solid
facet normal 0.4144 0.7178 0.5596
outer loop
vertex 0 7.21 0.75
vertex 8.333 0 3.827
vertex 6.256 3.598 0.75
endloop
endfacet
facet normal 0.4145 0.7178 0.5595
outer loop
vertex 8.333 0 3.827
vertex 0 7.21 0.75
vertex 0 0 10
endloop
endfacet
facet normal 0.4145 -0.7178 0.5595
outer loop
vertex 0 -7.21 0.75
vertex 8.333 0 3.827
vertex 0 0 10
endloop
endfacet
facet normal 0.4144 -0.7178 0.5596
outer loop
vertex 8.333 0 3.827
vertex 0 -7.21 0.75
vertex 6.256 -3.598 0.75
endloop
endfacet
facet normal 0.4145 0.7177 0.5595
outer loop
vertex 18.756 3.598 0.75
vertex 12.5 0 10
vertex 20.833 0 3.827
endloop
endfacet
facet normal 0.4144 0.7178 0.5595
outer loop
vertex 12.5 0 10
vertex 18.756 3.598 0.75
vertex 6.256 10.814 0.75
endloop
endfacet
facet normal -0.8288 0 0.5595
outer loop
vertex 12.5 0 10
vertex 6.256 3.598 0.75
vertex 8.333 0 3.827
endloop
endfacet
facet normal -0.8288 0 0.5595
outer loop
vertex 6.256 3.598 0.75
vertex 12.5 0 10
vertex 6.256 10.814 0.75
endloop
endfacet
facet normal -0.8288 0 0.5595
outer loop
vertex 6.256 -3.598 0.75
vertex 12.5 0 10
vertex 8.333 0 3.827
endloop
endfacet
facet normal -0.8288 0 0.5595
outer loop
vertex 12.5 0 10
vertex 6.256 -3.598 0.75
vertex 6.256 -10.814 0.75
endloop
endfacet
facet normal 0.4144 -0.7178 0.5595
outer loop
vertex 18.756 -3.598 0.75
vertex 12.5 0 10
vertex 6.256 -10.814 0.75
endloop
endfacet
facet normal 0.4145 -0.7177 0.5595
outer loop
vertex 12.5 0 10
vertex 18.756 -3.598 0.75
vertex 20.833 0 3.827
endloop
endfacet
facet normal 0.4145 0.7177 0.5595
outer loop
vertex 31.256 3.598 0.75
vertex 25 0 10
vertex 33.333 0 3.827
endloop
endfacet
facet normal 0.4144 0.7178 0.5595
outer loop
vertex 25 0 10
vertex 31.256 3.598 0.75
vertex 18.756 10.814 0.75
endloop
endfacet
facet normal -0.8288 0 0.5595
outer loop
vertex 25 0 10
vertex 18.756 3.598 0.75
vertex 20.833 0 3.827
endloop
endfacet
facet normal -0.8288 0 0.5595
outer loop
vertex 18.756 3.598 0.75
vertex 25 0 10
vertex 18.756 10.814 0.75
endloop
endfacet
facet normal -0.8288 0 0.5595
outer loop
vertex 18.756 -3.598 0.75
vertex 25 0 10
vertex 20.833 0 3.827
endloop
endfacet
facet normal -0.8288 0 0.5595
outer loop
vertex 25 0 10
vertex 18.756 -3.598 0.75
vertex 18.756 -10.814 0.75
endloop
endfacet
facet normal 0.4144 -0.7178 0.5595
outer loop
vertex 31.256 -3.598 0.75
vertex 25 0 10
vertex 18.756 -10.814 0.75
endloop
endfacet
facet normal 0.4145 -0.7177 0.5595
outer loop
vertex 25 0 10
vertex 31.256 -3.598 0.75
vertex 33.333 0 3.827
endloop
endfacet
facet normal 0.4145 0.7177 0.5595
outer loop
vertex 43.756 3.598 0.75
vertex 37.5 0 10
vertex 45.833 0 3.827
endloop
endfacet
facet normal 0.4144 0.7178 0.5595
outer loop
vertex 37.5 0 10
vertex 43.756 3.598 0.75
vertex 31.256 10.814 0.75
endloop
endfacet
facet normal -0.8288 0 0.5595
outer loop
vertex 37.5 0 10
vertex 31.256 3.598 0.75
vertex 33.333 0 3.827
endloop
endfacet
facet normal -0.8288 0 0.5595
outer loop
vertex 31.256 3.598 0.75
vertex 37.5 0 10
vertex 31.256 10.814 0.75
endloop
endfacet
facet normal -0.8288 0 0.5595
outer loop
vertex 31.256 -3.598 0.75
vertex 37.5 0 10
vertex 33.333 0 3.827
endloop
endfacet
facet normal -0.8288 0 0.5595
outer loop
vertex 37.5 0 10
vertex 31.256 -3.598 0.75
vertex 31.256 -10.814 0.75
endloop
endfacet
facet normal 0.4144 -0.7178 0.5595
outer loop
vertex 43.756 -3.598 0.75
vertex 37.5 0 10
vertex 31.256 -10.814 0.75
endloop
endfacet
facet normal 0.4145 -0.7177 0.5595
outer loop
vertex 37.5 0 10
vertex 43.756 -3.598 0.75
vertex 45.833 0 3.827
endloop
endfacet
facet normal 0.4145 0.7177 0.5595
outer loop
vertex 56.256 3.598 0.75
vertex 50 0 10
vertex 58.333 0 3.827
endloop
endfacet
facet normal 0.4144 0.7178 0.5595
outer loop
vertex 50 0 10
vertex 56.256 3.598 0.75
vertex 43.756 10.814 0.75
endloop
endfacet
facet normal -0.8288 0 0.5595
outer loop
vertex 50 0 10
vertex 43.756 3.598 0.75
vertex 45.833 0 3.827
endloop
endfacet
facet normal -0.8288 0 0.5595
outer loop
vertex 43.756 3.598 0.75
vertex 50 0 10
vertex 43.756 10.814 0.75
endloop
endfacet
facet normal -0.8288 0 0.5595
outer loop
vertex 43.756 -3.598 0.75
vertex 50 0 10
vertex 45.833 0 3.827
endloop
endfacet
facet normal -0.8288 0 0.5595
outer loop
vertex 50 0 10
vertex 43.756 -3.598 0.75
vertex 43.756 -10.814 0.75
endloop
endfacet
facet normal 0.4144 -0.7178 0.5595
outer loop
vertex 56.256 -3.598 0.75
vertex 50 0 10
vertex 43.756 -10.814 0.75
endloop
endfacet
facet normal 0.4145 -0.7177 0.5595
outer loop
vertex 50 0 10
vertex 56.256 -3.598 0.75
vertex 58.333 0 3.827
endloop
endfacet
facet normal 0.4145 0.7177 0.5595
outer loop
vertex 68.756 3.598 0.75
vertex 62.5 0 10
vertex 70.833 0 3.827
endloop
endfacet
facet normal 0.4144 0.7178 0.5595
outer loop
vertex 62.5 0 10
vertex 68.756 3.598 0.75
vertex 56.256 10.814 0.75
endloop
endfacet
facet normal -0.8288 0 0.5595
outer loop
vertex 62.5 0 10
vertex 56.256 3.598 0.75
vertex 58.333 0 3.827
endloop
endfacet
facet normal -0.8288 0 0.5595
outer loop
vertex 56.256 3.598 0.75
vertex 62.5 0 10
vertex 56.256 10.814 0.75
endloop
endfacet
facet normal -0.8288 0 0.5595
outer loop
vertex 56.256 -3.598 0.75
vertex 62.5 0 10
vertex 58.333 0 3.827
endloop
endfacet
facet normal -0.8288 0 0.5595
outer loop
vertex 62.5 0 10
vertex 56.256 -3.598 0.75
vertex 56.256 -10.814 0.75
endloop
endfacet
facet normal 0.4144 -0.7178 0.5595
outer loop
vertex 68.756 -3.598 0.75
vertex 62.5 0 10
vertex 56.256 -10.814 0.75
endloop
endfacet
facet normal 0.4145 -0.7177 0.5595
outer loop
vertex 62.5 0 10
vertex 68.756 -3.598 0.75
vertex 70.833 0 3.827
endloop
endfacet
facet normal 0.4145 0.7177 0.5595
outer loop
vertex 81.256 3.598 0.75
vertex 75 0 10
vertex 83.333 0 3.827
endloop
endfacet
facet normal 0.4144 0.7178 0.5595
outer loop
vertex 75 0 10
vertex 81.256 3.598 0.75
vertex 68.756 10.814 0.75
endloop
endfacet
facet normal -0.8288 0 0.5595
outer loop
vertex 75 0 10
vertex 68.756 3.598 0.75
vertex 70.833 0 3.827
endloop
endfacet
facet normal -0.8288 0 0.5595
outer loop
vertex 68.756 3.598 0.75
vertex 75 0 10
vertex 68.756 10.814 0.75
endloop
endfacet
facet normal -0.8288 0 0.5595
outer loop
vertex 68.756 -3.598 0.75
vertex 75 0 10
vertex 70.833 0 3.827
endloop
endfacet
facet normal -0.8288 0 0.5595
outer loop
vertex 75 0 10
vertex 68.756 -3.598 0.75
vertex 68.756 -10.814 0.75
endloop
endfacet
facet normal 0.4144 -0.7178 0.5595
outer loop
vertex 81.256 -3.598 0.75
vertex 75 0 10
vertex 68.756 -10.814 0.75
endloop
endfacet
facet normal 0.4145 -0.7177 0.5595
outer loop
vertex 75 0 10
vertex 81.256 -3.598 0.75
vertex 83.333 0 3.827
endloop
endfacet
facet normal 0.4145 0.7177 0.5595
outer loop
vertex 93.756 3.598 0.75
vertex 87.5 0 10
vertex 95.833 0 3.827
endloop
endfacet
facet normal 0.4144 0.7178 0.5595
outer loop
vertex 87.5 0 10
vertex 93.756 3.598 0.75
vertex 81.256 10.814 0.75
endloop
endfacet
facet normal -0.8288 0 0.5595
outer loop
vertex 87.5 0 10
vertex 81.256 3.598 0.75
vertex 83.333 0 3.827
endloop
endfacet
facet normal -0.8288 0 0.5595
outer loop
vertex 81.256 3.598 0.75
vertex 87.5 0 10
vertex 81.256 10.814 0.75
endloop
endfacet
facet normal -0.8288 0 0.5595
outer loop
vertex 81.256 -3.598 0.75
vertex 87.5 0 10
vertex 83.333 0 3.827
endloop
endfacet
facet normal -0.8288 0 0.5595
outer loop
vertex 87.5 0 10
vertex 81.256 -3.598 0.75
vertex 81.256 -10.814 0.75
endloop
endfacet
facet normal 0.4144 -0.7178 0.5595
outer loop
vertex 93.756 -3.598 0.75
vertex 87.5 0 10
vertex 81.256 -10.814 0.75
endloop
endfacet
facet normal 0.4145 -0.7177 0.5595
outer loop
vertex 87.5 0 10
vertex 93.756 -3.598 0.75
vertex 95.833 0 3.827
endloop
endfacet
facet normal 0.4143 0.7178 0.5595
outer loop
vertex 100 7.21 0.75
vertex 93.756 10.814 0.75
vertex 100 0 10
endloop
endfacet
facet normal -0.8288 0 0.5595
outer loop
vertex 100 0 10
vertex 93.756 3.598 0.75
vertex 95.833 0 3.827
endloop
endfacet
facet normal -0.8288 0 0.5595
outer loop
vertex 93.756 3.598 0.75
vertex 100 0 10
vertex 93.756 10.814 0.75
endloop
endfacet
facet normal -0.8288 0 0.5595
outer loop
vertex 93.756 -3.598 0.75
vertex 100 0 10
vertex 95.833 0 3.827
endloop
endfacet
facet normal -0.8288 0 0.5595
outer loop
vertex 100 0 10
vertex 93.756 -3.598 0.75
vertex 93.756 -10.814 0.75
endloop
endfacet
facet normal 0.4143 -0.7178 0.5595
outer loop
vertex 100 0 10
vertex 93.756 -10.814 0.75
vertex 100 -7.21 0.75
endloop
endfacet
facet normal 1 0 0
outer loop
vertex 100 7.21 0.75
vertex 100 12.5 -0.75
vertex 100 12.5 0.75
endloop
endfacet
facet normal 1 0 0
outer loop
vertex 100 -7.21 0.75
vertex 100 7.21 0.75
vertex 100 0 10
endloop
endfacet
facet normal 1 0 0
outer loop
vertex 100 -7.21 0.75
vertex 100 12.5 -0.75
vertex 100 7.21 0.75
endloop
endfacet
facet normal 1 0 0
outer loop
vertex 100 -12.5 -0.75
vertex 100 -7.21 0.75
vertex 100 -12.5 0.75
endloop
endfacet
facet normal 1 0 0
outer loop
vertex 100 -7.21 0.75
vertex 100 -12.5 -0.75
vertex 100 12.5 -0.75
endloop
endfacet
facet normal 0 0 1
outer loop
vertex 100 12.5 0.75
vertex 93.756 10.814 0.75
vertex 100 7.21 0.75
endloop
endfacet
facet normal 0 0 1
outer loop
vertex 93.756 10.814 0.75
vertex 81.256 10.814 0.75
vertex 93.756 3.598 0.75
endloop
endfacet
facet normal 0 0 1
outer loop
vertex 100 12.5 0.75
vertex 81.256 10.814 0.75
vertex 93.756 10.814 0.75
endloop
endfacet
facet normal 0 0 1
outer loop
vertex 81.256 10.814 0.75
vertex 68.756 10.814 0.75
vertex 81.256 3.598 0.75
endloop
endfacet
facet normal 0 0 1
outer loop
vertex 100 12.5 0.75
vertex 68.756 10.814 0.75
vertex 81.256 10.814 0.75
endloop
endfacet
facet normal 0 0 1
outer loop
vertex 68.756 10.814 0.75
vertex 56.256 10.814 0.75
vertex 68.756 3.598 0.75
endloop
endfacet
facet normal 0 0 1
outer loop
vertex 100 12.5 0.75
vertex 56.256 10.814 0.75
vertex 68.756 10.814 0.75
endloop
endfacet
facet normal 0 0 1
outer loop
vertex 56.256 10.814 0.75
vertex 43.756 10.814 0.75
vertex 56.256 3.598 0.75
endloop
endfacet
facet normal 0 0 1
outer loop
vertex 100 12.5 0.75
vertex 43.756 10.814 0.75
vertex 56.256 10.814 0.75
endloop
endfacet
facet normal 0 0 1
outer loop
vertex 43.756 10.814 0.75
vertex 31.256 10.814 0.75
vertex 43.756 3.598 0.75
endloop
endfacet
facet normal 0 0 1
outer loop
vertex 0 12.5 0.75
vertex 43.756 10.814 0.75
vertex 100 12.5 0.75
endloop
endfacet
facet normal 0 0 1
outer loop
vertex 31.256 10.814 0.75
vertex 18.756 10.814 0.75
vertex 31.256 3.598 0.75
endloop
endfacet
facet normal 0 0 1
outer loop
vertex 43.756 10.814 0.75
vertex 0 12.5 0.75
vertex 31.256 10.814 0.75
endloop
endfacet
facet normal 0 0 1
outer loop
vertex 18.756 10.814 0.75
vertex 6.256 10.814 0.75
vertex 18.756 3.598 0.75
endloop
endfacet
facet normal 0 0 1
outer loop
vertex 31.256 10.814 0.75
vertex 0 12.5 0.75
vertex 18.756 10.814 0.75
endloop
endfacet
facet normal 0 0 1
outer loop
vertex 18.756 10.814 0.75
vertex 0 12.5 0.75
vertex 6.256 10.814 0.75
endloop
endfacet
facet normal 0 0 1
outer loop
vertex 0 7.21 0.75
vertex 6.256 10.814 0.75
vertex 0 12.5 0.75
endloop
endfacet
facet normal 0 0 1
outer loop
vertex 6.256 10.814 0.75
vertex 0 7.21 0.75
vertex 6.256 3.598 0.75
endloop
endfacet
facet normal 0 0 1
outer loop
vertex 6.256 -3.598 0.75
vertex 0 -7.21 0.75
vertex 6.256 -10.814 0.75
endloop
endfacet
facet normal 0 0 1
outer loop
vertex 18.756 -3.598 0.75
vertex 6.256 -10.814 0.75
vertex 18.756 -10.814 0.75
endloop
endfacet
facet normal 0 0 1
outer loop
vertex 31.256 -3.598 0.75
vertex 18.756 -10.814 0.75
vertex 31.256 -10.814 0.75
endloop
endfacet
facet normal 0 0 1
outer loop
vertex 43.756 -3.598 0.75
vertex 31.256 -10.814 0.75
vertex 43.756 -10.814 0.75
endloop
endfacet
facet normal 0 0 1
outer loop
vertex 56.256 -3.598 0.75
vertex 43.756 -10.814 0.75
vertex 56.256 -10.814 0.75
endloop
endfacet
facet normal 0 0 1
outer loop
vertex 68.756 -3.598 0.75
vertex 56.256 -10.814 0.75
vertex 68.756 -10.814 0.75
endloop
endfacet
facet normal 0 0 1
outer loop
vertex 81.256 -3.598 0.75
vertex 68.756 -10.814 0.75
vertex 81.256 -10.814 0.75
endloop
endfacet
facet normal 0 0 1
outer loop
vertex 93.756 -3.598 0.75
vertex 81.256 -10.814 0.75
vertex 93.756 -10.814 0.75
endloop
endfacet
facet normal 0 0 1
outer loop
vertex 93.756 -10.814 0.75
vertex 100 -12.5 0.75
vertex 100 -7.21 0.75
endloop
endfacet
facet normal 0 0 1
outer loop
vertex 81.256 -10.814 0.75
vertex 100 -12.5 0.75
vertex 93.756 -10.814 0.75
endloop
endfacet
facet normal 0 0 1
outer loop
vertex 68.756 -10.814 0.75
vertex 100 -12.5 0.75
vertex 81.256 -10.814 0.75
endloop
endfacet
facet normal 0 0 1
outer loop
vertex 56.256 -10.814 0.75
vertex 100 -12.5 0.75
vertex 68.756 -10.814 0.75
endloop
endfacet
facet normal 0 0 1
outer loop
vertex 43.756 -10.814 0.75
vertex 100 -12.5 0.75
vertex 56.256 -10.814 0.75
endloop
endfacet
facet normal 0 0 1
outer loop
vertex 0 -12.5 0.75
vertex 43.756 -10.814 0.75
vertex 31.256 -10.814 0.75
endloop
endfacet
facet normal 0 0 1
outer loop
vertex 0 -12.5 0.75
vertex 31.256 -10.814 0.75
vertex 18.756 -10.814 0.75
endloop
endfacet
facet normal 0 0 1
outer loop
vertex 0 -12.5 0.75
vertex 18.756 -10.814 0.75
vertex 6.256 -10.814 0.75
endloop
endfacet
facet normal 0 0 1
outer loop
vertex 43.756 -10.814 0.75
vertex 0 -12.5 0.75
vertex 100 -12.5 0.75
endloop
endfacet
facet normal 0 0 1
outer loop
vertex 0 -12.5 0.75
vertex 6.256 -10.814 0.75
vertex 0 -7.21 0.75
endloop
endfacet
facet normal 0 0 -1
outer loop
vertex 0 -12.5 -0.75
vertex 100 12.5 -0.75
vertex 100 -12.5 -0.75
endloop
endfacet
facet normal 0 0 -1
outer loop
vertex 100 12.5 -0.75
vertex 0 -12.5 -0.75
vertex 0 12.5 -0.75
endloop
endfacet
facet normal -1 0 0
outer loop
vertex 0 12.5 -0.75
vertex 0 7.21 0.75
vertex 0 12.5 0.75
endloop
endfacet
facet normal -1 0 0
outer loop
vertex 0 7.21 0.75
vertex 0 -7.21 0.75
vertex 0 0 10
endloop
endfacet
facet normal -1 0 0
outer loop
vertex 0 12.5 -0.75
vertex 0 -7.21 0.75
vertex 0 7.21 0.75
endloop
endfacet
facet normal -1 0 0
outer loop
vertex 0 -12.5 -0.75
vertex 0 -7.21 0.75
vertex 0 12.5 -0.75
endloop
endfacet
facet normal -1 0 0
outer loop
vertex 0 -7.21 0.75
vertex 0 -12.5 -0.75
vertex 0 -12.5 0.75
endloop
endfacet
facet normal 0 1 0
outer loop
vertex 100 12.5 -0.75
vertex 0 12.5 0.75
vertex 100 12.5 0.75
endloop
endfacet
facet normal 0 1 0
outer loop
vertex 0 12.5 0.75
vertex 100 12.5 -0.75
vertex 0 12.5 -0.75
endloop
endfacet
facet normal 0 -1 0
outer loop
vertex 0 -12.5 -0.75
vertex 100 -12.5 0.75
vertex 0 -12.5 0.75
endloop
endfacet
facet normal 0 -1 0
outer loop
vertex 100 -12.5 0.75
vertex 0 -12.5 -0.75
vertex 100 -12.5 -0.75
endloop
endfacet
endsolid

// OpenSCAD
$r = 25 / 2;
$r2 = 11 / 2;
$d = 1.5;
$fn = 3;
$links = 8;

difference() {
    union() {
for (i = [0:$links]) {
    
     translate([i * $r, 0, 5]) {
        rotate([0, 0, 0]) {
            cylinder(10, $r+1, 0, true);
        }
     }
}
translate([($links)/2 * $r, 0, 0]) {
     cube([$r * ($links ), $r*2 , $d], true);
}
}
translate([-25, 0, 0]) {
    cube([50, 50, 50], true);
}
translate([($links) * $r + 25, 0, 0]) {
    cube([50, 50, 50], true);
}
}
